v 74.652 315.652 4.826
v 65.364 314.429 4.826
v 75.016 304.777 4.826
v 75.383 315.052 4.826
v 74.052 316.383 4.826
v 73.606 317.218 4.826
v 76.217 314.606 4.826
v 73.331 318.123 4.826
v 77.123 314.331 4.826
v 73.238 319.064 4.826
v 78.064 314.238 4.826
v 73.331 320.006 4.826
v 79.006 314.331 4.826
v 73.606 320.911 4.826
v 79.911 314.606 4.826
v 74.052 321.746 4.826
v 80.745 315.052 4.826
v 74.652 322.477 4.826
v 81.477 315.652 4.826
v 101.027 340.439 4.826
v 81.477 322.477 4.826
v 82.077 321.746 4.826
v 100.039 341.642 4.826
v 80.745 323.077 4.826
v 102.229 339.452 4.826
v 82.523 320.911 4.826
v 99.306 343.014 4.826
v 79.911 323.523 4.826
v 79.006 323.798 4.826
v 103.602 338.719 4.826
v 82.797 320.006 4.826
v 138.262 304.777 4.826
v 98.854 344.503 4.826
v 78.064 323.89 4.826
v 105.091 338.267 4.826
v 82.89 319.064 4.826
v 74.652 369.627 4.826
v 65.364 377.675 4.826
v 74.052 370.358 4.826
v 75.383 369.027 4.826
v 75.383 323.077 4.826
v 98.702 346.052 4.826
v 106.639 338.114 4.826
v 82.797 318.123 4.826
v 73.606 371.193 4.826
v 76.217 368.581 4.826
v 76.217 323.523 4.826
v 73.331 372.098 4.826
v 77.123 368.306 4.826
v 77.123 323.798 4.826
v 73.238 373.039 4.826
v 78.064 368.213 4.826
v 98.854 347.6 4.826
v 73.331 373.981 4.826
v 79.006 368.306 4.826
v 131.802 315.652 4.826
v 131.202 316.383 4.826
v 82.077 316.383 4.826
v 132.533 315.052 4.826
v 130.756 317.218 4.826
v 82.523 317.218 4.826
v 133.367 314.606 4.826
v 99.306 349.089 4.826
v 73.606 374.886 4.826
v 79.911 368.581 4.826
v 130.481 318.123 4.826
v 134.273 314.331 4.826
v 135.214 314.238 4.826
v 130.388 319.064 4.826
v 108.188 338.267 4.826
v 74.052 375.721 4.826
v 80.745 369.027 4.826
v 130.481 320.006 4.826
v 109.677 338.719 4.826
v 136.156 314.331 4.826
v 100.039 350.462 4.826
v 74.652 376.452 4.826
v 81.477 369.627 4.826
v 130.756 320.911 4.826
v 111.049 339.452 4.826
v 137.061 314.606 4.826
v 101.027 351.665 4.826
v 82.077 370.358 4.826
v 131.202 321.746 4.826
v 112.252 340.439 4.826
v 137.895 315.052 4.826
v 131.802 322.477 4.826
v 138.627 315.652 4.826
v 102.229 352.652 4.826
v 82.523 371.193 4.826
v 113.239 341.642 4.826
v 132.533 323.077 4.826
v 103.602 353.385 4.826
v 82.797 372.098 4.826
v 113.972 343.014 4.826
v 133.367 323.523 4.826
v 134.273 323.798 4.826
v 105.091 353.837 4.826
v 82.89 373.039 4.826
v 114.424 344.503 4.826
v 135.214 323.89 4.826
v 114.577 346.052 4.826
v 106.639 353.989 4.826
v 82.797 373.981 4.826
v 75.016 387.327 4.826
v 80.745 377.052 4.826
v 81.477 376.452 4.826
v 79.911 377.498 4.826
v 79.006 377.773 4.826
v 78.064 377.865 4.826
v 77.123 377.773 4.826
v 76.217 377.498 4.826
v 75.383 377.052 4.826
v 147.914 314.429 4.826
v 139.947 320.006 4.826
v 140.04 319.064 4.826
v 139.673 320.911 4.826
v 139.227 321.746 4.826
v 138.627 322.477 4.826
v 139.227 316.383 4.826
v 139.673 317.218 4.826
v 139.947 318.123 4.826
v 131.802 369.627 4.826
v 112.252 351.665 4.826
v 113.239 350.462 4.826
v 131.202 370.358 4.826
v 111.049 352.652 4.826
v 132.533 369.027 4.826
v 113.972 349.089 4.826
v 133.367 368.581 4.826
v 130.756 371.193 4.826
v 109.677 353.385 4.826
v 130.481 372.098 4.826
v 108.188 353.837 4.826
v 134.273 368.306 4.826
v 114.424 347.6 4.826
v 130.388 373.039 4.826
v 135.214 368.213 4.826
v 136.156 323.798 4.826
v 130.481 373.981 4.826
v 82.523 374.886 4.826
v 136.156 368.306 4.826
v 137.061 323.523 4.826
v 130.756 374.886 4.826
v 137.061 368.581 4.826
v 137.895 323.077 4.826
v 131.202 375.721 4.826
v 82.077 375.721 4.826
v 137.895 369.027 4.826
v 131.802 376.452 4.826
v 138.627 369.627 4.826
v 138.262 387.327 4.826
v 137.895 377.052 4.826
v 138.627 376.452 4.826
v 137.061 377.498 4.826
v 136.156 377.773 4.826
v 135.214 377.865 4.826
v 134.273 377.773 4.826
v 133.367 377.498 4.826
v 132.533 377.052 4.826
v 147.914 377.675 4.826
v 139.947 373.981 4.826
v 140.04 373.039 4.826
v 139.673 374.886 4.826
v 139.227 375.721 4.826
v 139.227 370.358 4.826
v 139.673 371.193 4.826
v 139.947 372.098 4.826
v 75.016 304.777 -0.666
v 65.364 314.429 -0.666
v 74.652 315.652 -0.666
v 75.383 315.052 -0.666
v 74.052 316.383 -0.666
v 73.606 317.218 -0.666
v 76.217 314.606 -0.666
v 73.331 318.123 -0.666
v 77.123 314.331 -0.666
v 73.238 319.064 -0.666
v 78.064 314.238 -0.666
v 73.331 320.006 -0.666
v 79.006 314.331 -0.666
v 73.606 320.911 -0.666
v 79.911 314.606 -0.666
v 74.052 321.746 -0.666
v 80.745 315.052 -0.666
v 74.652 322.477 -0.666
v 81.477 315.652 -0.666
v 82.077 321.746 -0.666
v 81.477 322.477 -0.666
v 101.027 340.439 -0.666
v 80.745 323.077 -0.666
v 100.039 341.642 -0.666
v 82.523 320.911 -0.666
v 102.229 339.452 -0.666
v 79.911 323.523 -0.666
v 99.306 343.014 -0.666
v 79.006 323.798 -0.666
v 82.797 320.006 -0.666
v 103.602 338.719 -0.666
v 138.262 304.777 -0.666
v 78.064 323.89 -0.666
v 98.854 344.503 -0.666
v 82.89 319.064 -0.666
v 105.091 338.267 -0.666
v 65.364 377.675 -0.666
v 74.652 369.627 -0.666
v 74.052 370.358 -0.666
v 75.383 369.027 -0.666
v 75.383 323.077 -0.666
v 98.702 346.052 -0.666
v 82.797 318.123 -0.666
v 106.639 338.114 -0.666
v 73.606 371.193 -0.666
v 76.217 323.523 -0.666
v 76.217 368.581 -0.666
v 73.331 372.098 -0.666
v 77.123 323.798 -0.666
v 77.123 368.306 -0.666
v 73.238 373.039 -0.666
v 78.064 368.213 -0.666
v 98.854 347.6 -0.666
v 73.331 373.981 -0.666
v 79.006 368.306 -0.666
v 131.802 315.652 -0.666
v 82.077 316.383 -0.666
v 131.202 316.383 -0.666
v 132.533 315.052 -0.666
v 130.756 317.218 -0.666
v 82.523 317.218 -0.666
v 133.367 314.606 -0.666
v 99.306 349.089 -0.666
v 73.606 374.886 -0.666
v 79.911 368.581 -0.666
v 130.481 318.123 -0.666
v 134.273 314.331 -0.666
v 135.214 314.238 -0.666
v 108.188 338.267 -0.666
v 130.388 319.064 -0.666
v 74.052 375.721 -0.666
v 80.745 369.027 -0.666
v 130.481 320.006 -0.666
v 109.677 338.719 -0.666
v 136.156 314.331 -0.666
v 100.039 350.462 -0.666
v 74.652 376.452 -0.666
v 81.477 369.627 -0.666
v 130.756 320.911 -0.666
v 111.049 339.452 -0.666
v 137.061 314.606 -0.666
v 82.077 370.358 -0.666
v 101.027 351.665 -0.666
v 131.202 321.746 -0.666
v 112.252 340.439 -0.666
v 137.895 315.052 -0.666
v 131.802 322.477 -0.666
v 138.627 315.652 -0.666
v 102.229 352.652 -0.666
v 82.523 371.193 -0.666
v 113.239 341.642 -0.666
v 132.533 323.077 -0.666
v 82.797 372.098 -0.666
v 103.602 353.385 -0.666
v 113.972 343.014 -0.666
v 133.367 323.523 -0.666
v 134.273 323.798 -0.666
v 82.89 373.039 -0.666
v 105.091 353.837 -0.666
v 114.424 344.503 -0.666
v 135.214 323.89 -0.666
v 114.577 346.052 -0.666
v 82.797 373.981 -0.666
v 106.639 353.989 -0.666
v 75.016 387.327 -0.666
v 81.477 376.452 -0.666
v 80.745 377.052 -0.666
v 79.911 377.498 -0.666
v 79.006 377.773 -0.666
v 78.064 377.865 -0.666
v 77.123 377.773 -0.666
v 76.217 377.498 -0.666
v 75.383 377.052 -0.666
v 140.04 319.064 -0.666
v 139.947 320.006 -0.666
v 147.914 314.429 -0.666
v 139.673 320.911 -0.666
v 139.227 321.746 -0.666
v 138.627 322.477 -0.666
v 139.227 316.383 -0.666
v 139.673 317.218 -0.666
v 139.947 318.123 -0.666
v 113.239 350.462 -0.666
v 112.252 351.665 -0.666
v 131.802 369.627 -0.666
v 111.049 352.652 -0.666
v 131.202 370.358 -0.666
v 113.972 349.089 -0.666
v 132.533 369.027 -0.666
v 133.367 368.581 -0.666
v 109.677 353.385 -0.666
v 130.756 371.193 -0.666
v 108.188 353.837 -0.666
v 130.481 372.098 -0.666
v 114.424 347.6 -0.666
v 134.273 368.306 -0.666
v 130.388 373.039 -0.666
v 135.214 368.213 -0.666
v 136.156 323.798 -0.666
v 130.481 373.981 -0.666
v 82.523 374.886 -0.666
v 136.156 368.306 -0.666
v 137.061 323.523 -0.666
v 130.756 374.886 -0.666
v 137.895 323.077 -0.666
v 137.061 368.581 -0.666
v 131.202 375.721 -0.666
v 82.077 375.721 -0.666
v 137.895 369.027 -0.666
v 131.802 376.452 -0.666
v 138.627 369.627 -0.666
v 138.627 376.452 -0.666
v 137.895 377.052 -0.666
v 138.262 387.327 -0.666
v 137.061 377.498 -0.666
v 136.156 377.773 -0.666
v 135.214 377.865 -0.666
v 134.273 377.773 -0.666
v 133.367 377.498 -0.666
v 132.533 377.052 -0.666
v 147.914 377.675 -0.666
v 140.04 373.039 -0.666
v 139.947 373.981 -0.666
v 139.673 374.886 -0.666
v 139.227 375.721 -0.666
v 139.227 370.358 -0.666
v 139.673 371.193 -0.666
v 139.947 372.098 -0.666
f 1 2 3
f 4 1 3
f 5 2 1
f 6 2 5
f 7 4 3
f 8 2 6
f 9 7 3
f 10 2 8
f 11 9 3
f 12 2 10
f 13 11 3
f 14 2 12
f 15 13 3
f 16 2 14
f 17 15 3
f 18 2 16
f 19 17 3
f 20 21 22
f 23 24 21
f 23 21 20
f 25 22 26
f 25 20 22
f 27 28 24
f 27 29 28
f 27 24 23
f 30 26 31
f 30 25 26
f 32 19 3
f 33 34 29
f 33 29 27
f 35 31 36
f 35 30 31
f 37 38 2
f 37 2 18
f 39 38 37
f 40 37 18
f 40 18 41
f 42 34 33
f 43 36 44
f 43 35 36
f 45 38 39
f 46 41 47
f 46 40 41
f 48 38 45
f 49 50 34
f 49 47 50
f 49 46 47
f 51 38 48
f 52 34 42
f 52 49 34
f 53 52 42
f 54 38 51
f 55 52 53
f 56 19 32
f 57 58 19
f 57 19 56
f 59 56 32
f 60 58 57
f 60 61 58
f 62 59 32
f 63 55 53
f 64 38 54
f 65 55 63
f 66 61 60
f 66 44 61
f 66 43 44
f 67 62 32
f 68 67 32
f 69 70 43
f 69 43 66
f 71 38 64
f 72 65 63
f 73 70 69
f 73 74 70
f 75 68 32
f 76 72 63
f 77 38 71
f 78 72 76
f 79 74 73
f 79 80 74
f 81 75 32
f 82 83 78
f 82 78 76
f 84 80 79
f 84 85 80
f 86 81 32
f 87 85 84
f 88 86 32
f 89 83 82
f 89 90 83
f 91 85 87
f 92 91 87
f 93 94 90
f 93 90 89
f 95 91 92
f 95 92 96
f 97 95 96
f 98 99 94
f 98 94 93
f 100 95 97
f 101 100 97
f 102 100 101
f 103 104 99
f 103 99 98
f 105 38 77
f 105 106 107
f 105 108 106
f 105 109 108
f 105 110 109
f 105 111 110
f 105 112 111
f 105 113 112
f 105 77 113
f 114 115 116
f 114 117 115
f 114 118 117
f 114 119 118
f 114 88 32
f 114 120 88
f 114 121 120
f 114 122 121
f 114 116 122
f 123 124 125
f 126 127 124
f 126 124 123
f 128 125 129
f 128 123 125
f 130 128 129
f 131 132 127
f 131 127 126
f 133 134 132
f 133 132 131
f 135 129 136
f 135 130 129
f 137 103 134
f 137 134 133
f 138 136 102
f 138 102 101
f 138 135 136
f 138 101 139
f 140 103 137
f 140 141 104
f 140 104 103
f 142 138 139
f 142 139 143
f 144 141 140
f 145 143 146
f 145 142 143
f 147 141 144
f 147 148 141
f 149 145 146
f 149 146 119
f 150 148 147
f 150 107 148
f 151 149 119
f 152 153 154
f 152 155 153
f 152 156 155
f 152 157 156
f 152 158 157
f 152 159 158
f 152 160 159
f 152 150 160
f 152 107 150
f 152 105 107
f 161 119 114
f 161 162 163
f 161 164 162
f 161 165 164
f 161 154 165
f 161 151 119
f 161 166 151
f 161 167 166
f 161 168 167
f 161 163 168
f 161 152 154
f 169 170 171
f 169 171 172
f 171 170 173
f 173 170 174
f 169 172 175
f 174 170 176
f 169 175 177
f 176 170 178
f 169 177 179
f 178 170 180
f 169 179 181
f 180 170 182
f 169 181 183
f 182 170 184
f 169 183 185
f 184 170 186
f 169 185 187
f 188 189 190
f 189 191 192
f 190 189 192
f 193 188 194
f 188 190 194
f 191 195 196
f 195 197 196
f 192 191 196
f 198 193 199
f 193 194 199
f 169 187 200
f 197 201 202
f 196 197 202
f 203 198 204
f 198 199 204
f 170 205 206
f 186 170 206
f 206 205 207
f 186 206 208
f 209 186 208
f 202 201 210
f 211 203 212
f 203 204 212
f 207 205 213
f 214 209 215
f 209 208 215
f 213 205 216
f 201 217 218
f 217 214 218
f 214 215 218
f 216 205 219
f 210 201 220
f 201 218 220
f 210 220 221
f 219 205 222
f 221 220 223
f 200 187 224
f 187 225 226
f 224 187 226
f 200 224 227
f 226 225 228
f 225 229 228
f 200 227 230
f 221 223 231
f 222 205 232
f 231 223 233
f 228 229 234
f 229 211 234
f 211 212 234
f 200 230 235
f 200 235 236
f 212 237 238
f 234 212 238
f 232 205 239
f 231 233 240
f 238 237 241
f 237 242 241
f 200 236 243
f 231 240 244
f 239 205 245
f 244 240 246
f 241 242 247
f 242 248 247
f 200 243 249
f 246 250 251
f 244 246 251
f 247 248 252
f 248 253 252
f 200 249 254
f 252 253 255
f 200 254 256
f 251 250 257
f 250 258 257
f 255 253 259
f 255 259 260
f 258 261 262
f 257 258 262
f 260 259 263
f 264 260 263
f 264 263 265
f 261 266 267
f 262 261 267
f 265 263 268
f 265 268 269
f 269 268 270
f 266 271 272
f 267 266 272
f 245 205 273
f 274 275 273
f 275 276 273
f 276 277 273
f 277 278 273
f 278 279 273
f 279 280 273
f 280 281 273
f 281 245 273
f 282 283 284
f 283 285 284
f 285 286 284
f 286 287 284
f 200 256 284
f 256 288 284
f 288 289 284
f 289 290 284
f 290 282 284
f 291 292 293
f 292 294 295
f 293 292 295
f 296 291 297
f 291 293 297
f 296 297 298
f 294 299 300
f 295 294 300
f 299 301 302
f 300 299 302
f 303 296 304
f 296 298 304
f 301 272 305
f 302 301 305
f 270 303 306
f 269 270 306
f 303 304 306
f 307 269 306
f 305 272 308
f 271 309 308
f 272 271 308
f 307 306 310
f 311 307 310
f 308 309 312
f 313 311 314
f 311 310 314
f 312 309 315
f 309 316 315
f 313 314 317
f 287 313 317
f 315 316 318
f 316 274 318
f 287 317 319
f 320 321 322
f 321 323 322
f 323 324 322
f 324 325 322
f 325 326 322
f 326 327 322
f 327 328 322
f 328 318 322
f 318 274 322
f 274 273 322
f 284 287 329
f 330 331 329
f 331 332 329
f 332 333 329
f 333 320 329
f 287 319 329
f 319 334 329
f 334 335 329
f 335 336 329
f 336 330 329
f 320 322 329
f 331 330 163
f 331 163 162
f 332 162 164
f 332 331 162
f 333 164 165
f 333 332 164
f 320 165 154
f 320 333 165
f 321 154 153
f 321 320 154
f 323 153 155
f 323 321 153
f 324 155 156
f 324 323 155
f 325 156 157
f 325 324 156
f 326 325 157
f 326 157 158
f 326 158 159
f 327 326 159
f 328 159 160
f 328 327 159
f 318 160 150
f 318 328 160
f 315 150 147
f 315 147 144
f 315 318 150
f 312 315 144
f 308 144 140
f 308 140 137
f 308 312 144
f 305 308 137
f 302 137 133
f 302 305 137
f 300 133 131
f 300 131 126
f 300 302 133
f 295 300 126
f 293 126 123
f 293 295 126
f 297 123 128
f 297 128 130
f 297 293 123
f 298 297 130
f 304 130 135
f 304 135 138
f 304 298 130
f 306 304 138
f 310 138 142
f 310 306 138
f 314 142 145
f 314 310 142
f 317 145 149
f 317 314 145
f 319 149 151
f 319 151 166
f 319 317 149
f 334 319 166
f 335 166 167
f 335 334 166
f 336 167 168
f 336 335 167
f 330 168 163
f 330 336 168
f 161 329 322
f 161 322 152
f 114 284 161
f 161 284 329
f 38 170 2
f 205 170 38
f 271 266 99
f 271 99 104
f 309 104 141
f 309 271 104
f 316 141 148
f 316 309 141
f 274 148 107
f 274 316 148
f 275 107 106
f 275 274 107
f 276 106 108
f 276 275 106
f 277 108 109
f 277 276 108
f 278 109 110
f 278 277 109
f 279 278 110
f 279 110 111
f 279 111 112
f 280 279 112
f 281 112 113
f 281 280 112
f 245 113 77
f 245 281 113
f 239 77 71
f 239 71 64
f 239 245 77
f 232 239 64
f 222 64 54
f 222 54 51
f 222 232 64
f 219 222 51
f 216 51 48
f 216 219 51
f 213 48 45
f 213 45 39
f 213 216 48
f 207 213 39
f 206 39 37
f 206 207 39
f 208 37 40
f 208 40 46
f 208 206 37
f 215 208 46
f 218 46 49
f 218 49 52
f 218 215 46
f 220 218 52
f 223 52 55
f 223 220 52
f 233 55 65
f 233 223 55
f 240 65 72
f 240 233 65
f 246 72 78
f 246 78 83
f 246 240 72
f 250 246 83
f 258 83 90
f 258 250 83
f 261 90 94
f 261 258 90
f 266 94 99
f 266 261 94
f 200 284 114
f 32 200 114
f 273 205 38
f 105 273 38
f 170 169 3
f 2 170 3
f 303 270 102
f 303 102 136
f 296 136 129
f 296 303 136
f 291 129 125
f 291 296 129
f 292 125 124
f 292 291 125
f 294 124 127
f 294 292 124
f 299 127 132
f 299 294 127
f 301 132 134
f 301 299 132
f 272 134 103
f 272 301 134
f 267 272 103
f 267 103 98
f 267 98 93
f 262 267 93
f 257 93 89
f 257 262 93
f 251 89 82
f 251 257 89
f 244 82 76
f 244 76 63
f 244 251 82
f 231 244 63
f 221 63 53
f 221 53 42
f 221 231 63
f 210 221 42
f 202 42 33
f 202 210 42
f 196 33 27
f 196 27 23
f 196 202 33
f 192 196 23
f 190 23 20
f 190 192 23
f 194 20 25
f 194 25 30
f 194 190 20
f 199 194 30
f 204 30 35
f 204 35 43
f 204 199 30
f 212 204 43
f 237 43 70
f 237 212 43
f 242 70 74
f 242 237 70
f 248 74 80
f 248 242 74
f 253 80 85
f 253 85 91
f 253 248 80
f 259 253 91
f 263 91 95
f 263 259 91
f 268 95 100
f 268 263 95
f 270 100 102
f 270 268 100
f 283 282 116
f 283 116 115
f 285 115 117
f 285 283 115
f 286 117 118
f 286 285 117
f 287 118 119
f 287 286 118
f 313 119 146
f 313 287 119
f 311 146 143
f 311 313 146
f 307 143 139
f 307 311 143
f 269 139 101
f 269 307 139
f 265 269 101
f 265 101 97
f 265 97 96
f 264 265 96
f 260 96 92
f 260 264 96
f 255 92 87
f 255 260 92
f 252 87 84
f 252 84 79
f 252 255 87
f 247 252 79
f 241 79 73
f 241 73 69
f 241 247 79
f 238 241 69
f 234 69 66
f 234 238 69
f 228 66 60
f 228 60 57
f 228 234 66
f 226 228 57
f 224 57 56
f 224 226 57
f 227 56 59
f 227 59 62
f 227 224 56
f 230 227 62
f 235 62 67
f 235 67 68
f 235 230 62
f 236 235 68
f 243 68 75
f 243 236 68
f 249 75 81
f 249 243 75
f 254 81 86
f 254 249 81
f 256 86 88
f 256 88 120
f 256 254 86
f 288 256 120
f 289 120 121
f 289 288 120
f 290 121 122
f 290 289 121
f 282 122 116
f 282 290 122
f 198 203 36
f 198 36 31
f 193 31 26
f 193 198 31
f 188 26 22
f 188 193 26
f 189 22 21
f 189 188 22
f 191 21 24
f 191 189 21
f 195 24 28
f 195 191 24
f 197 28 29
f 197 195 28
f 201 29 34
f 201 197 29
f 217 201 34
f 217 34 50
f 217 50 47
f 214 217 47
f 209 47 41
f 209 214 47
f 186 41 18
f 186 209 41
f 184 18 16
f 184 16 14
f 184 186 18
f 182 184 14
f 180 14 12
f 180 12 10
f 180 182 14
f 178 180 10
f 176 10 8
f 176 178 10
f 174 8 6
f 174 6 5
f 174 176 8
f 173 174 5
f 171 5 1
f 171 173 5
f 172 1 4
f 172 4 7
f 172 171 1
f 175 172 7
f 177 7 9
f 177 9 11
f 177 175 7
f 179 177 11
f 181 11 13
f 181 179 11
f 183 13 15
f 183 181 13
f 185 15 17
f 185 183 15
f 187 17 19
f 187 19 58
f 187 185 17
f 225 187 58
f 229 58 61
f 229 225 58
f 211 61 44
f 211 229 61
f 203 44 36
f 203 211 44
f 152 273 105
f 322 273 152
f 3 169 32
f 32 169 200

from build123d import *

# Parameters (mm, degrees)
BOSS_EXTRUDE1_DEPTH      = 4.826
BOSS_EXTRUDE1_DEPTH_BACK = 0.666205528
SKETCH1_W                = 82.55
SKETCH1_H                = 82.55
SKETCH1_R                = 4.826
SKETCH1_R_2              = 7.9375
CHAMFER1_SIZE            = 9.652


with BuildPart() as part:
    # Sketch1 → Boss-Extrude1 (new, two sides: drawn at the far end of the back side and taken through both)
    with BuildSketch(Plane(origin=(106.639199962, 25.37693728, 0), x_dir=(1, 0, 0), z_dir=(0, 0, 1)).offset(-BOSS_EXTRUDE1_DEPTH_BACK)):
        with Locations((0, 320.675)):
            Rectangle(SKETCH1_W, SKETCH1_H)
        with Locations((-28.575, 347.6625)):
            Circle(SKETCH1_R, mode=Mode.SUBTRACT)
        with Locations((-28.575, 293.6875)):
            Circle(SKETCH1_R, mode=Mode.SUBTRACT)
        with Locations((28.575, 347.6625)):
            Circle(SKETCH1_R, mode=Mode.SUBTRACT)
        with Locations((28.575, 293.6875)):
            Circle(SKETCH1_R, mode=Mode.SUBTRACT)
        with Locations((0, 320.675)):
            Circle(SKETCH1_R_2, mode=Mode.SUBTRACT)
    extrude(amount=BOSS_EXTRUDE1_DEPTH + BOSS_EXTRUDE1_DEPTH_BACK)

    # Chamfer1
    chamfer1_edges = [part.edges().sort_by_distance(p)[0] for p in [
        (147.914199962, 304.77693728, 2.079897236),
        (65.364199962, 304.77693728, 2.079897236),
        (65.364199962, 387.32693728, 2.079897236),
        (147.914199962, 387.32693728, 2.079897236),
    ]]
    chamfer(chamfer1_edges, length=CHAMFER1_SIZE)


solid = part.part
